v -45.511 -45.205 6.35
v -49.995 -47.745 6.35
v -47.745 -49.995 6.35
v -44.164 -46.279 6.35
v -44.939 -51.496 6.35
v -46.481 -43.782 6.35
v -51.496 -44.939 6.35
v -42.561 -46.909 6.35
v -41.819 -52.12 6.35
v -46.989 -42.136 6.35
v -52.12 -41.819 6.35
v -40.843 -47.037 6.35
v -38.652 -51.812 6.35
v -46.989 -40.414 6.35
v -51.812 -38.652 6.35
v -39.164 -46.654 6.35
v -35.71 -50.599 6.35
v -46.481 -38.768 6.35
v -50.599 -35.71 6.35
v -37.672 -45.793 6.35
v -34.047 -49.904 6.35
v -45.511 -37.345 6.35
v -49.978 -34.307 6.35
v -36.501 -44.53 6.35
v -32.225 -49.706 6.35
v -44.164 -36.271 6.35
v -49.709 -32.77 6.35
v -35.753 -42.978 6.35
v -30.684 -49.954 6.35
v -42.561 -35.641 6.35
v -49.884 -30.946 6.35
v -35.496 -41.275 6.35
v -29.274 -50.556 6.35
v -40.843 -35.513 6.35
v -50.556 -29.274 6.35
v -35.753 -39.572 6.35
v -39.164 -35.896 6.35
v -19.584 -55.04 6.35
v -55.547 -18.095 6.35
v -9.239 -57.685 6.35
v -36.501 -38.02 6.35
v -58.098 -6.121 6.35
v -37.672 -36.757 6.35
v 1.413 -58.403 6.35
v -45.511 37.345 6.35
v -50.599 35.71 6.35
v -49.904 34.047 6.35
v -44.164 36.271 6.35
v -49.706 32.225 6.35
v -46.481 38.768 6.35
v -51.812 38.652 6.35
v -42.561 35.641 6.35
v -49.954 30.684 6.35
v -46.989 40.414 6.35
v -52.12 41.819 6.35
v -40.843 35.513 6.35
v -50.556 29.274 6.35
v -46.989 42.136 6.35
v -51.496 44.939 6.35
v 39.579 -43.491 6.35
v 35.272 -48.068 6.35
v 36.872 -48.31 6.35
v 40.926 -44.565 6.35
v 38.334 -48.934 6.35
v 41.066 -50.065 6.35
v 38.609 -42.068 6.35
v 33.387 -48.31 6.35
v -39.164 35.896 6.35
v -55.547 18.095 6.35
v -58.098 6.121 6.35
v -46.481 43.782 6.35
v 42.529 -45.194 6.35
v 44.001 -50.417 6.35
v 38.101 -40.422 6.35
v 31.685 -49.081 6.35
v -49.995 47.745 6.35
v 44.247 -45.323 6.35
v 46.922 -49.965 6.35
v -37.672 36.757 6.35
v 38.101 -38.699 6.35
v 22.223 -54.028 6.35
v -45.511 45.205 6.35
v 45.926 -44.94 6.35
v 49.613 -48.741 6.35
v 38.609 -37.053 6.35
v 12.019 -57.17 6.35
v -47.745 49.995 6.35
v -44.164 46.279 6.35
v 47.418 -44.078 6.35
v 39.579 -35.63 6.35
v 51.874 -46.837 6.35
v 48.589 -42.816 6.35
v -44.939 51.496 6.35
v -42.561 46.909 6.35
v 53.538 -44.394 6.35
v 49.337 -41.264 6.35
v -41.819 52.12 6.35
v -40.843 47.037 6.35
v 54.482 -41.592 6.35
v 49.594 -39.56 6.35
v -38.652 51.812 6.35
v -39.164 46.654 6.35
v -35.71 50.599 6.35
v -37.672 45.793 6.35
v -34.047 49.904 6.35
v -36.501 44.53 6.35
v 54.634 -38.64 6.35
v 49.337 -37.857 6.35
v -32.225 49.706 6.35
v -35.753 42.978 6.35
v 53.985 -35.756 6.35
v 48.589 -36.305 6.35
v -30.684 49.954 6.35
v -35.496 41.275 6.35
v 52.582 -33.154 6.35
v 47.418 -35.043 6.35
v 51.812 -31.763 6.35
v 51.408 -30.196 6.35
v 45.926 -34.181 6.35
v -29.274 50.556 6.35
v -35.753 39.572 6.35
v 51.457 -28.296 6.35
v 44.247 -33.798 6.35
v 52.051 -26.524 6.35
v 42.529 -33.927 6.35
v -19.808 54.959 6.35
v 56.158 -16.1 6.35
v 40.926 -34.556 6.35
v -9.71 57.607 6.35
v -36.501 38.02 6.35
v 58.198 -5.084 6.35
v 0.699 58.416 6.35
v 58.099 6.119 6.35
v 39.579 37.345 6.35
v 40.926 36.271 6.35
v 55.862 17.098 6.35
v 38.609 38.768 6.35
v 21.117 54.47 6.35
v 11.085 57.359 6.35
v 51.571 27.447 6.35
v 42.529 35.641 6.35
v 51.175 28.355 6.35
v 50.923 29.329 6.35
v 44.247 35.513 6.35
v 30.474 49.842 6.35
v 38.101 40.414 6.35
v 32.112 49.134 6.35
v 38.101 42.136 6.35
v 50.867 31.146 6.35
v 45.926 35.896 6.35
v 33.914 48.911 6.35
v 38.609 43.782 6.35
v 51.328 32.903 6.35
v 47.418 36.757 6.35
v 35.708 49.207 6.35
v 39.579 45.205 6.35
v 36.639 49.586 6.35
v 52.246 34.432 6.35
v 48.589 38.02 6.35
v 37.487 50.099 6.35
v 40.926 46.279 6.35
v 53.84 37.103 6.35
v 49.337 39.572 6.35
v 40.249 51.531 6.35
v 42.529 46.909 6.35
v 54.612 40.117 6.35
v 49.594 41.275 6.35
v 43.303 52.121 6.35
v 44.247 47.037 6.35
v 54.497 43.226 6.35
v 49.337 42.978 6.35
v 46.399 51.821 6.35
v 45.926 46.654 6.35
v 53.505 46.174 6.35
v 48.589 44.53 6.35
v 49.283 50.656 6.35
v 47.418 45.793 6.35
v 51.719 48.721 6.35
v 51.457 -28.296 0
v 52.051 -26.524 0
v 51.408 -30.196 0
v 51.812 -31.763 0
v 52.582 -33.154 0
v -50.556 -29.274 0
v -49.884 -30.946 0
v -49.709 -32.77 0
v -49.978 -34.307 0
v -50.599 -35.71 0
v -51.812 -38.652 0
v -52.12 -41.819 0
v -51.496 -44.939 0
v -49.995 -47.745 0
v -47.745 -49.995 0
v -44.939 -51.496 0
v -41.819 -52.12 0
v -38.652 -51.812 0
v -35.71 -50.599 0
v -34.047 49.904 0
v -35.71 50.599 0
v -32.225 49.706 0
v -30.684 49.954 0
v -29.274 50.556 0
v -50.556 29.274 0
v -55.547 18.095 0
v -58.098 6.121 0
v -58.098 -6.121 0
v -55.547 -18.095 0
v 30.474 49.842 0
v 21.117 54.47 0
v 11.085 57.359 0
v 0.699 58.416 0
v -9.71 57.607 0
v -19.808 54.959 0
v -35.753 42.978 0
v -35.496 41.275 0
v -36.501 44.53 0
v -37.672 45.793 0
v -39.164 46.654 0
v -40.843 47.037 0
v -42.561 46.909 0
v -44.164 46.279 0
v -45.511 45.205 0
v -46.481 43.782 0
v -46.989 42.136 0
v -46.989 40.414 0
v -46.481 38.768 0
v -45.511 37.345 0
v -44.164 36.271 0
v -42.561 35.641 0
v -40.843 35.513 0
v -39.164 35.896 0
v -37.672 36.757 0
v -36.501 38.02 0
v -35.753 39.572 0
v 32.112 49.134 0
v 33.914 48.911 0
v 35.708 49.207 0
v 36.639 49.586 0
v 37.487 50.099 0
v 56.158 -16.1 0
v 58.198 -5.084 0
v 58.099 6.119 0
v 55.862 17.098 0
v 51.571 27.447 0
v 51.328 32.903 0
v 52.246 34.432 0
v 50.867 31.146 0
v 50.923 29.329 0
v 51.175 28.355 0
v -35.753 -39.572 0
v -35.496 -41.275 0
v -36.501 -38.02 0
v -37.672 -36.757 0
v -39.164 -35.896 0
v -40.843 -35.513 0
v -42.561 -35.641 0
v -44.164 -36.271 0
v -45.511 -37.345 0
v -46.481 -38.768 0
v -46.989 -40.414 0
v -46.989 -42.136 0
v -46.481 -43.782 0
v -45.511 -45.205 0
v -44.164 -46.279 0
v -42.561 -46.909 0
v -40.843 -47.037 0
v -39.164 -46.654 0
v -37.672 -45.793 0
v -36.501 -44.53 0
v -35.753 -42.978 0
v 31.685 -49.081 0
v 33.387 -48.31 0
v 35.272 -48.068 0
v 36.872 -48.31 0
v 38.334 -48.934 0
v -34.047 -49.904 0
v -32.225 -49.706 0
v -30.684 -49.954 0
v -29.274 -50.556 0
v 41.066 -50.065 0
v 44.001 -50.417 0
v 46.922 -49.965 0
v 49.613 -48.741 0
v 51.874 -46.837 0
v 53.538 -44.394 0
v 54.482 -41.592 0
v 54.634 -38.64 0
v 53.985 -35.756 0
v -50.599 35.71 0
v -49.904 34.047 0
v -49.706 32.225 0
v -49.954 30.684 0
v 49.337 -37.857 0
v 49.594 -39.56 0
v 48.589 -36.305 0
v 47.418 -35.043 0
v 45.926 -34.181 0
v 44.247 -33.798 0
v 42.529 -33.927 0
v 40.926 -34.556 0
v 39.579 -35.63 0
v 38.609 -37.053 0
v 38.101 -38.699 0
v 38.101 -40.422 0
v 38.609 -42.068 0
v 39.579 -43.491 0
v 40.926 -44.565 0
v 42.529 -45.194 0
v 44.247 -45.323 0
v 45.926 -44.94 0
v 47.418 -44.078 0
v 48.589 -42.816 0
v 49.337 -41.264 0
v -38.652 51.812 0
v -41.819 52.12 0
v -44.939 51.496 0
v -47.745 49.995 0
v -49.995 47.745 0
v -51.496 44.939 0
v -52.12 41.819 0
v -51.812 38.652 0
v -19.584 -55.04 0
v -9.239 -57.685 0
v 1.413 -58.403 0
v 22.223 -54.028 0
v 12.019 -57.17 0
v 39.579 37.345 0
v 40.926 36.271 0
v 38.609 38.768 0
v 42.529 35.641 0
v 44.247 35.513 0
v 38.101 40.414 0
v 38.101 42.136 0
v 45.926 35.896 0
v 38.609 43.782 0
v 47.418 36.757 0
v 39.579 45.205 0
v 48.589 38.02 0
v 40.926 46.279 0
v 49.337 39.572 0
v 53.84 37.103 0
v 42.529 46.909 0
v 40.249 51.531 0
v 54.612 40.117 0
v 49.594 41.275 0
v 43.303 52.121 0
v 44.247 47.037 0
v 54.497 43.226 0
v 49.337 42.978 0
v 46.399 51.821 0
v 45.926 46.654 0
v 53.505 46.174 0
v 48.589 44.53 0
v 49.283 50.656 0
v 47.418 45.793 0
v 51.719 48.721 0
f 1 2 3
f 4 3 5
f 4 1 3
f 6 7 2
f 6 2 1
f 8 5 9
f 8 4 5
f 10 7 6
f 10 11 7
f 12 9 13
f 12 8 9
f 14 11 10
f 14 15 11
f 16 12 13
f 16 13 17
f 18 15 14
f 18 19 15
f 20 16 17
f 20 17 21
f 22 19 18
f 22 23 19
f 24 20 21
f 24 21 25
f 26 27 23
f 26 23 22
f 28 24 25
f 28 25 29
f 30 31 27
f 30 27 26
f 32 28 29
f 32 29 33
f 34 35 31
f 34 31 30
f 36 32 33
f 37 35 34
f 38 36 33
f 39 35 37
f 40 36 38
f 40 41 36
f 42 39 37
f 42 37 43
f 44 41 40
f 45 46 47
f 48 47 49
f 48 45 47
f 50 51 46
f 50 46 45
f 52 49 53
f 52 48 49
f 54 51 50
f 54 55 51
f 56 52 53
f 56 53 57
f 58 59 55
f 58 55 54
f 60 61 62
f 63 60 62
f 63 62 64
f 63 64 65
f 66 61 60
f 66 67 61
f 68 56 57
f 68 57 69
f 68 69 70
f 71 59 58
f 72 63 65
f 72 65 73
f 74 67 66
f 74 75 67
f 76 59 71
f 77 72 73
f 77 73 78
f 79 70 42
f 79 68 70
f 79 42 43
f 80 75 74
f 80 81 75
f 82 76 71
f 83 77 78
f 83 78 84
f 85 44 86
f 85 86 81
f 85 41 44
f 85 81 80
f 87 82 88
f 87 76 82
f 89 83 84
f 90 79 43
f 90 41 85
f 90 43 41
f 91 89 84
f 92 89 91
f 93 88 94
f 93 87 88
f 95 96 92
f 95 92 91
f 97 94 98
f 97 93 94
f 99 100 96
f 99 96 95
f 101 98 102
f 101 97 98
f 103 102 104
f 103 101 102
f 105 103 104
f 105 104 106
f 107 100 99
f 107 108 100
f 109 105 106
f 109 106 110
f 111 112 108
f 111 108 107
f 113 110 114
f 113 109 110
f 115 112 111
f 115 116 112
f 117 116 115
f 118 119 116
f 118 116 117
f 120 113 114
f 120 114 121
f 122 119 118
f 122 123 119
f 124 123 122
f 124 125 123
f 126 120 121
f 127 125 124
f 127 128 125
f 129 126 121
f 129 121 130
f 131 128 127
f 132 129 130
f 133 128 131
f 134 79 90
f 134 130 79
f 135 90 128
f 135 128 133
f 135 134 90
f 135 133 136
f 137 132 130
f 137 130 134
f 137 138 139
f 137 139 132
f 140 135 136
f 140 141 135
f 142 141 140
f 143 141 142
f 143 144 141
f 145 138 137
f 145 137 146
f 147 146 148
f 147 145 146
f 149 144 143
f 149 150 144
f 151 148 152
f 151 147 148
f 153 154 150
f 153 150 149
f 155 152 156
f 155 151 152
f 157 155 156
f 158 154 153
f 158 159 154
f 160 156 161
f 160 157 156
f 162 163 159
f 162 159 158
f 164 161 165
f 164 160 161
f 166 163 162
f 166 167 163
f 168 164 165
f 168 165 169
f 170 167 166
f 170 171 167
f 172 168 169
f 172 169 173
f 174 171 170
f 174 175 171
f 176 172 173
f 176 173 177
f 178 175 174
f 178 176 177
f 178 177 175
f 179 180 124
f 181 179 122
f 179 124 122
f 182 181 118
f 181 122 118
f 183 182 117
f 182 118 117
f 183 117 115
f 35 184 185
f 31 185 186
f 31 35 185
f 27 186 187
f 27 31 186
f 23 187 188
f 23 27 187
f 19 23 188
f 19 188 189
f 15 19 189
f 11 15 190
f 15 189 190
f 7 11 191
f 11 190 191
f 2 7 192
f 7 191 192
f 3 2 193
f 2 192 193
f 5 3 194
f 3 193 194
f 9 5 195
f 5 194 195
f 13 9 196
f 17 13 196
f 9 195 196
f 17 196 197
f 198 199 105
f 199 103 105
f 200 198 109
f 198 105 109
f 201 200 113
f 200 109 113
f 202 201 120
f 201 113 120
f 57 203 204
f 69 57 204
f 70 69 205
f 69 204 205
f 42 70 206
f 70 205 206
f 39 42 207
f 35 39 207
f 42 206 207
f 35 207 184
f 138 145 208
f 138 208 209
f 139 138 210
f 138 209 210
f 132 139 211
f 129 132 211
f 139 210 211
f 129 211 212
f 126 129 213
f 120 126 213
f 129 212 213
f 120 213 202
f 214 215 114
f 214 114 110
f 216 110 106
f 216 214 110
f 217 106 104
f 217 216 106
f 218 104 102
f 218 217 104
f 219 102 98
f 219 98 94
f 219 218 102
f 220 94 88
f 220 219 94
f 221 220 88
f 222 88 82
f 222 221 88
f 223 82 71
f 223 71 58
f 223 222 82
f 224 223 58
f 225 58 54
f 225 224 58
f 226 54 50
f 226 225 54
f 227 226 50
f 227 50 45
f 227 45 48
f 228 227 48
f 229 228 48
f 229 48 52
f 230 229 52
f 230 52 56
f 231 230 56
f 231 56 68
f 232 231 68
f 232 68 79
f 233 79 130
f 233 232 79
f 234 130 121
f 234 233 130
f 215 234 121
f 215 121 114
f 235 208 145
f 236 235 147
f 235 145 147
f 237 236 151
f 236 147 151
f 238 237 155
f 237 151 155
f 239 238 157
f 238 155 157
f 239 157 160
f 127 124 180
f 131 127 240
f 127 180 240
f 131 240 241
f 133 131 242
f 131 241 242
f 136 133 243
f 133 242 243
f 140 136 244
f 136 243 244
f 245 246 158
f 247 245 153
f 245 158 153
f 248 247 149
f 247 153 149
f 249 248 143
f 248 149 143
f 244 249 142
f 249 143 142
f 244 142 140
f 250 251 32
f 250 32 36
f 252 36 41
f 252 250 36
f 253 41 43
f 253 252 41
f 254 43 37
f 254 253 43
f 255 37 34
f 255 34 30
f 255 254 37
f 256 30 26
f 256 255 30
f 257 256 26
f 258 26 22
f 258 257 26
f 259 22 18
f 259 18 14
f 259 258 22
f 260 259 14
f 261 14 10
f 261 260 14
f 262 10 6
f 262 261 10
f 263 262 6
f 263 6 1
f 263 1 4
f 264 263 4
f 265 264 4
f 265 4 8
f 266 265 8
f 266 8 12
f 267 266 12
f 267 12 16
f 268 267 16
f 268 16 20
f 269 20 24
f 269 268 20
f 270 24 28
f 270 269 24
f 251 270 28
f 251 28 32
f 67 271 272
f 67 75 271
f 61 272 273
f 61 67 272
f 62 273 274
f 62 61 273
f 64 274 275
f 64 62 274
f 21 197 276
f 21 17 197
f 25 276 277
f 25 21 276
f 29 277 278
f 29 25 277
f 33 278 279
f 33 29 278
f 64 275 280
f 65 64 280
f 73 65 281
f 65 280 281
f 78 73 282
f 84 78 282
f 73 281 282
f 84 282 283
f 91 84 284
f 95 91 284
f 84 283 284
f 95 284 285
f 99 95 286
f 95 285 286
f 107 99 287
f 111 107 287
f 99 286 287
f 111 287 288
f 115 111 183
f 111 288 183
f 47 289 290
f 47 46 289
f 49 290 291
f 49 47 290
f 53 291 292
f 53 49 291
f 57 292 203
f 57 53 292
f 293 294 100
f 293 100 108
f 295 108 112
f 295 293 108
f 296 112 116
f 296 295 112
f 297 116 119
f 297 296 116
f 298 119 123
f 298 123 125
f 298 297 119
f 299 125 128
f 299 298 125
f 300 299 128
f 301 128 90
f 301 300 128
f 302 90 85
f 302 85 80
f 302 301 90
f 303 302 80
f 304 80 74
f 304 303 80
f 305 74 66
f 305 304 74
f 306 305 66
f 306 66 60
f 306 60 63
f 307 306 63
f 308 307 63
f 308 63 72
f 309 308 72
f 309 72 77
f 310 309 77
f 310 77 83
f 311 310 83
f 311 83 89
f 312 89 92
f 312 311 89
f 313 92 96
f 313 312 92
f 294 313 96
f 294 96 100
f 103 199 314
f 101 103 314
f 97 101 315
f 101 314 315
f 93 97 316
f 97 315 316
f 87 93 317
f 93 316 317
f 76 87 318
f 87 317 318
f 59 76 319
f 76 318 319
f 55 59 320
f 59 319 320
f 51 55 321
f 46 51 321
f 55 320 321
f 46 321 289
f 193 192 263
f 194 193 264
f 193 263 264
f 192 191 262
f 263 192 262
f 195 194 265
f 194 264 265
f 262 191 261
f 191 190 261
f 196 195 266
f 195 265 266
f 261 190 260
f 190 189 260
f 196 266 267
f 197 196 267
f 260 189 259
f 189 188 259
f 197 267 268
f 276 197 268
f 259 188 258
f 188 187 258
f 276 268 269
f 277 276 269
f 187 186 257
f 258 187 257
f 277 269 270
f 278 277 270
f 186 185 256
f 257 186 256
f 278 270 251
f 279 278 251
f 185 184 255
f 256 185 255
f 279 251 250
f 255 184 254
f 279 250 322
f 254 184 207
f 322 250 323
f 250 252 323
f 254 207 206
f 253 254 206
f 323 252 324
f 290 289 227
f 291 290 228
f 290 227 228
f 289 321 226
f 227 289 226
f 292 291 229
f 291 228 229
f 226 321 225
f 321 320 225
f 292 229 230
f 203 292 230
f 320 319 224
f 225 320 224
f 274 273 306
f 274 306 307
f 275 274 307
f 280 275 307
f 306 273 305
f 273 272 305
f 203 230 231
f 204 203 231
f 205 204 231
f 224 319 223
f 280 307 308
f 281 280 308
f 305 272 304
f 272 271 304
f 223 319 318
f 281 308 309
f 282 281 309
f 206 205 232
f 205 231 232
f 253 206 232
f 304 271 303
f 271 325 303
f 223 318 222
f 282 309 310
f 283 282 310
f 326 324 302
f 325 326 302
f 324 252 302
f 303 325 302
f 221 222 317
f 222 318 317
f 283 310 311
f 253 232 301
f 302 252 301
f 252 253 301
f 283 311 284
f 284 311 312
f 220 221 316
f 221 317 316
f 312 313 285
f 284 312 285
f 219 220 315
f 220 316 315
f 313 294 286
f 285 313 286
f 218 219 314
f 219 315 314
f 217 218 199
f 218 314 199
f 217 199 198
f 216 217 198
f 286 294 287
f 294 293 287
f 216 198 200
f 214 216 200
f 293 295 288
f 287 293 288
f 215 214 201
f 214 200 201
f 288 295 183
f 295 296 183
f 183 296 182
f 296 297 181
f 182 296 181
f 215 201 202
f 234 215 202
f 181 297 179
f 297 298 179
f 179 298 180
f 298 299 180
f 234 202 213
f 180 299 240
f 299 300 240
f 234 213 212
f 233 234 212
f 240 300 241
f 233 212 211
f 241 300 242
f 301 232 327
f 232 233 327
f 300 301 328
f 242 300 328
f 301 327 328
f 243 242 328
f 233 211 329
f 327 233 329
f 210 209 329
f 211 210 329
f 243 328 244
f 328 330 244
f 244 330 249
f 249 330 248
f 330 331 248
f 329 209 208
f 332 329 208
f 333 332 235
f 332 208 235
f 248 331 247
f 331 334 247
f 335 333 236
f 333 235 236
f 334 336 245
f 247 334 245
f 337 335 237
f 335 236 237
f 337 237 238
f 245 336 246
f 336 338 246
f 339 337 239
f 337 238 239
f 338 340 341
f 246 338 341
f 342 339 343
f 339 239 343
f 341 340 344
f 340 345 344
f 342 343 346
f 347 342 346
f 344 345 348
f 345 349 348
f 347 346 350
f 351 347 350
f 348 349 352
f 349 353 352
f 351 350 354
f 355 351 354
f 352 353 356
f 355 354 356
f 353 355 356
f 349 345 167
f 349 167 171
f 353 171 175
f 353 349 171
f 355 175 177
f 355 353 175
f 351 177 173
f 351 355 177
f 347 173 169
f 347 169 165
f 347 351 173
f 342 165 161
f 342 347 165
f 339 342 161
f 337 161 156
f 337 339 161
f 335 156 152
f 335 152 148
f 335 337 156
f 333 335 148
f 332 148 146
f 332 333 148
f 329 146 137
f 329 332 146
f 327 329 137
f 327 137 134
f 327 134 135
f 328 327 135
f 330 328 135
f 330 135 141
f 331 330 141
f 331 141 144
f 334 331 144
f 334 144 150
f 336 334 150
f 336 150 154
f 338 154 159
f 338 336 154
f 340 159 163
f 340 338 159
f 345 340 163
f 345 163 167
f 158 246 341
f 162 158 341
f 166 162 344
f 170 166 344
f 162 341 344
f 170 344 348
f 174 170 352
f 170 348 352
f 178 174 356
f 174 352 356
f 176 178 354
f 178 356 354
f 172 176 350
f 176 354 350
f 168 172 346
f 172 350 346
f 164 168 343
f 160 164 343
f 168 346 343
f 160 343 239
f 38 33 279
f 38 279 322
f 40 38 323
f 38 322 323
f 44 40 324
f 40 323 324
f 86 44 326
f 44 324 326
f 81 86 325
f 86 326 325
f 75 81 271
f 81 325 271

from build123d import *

# Parameters (mm, degrees)
F0_R     = 5.7785
F1_DEPTH = 6.35
F2_R     = 6.35


with BuildPart() as f1:
    # F0 (on Top) → F1 (new body)
    with BuildSketch(Plane.XY):
        with BuildLine():
            ThreePointArc((-32.9470856511, 48.2429885797), (-48.9531189835, 48.9531189835), (-48.2429885797, 32.9470856511))
            ThreePointArc((-48.2429885797, 32.9470856511), (-58.42, 0), (-48.2429885797, -32.9470856511))
            ThreePointArc((-48.2429885797, -32.9470856511), (-48.9531189835, -48.9531189835), (-32.9470856511, -48.2429885797))
            ThreePointArc((-32.9470856511, -48.2429885797), (1.5282374195, -58.4000076232), (35.4251532331, -46.4537933695))
            ThreePointArc((35.4251532331, -46.4537933695), (51.8744333617, -46.8373507019), (49.8184745785, -30.5125546401))
            ThreePointArc((49.8184745785, -30.5125546401), (58.4153919217, 0.7337483426), (49.0363490334, 31.7542575646))
            ThreePointArc((49.0363490334, 31.7542575646), (51.7187959431, 48.720604874), (34.622654511, 47.0549486729))
            ThreePointArc((34.622654511, 47.0549486729), (1.0270065512, 58.4109720647), (-32.9470856511, 48.2429885797))
        make_face()
        with Locations((-41.275, -41.275)):
            Circle(F0_R, mode=Mode.SUBTRACT)
        with Locations((43.815, -39.5605)):
            Circle(F0_R, mode=Mode.SUBTRACT)
        with Locations((-41.275, 41.275)):
            Circle(F0_R, mode=Mode.SUBTRACT)
        with Locations((43.815, 41.275)):
            Circle(F0_R, mode=Mode.SUBTRACT)
    extrude(amount=F1_DEPTH)

    # F2
    f2_edges = [f1.edges().sort_by_distance(p)[0] for p in [
        (-48.242989, 32.947086, 3.175),
        (35.425153, -46.453793, 3.175),
        (49.818475, -30.512555, 3.175),
        (-32.947086, 48.242989, 3.175),
        (34.622655, 47.054949, 3.175),
        (49.036349, 31.754258, 3.175),
        (-48.242989, -32.947086, 3.175),
        (-32.947086, -48.242989, 3.175),
    ]]
    fillet(f2_edges, radius=F2_R)


solid = f1.part
